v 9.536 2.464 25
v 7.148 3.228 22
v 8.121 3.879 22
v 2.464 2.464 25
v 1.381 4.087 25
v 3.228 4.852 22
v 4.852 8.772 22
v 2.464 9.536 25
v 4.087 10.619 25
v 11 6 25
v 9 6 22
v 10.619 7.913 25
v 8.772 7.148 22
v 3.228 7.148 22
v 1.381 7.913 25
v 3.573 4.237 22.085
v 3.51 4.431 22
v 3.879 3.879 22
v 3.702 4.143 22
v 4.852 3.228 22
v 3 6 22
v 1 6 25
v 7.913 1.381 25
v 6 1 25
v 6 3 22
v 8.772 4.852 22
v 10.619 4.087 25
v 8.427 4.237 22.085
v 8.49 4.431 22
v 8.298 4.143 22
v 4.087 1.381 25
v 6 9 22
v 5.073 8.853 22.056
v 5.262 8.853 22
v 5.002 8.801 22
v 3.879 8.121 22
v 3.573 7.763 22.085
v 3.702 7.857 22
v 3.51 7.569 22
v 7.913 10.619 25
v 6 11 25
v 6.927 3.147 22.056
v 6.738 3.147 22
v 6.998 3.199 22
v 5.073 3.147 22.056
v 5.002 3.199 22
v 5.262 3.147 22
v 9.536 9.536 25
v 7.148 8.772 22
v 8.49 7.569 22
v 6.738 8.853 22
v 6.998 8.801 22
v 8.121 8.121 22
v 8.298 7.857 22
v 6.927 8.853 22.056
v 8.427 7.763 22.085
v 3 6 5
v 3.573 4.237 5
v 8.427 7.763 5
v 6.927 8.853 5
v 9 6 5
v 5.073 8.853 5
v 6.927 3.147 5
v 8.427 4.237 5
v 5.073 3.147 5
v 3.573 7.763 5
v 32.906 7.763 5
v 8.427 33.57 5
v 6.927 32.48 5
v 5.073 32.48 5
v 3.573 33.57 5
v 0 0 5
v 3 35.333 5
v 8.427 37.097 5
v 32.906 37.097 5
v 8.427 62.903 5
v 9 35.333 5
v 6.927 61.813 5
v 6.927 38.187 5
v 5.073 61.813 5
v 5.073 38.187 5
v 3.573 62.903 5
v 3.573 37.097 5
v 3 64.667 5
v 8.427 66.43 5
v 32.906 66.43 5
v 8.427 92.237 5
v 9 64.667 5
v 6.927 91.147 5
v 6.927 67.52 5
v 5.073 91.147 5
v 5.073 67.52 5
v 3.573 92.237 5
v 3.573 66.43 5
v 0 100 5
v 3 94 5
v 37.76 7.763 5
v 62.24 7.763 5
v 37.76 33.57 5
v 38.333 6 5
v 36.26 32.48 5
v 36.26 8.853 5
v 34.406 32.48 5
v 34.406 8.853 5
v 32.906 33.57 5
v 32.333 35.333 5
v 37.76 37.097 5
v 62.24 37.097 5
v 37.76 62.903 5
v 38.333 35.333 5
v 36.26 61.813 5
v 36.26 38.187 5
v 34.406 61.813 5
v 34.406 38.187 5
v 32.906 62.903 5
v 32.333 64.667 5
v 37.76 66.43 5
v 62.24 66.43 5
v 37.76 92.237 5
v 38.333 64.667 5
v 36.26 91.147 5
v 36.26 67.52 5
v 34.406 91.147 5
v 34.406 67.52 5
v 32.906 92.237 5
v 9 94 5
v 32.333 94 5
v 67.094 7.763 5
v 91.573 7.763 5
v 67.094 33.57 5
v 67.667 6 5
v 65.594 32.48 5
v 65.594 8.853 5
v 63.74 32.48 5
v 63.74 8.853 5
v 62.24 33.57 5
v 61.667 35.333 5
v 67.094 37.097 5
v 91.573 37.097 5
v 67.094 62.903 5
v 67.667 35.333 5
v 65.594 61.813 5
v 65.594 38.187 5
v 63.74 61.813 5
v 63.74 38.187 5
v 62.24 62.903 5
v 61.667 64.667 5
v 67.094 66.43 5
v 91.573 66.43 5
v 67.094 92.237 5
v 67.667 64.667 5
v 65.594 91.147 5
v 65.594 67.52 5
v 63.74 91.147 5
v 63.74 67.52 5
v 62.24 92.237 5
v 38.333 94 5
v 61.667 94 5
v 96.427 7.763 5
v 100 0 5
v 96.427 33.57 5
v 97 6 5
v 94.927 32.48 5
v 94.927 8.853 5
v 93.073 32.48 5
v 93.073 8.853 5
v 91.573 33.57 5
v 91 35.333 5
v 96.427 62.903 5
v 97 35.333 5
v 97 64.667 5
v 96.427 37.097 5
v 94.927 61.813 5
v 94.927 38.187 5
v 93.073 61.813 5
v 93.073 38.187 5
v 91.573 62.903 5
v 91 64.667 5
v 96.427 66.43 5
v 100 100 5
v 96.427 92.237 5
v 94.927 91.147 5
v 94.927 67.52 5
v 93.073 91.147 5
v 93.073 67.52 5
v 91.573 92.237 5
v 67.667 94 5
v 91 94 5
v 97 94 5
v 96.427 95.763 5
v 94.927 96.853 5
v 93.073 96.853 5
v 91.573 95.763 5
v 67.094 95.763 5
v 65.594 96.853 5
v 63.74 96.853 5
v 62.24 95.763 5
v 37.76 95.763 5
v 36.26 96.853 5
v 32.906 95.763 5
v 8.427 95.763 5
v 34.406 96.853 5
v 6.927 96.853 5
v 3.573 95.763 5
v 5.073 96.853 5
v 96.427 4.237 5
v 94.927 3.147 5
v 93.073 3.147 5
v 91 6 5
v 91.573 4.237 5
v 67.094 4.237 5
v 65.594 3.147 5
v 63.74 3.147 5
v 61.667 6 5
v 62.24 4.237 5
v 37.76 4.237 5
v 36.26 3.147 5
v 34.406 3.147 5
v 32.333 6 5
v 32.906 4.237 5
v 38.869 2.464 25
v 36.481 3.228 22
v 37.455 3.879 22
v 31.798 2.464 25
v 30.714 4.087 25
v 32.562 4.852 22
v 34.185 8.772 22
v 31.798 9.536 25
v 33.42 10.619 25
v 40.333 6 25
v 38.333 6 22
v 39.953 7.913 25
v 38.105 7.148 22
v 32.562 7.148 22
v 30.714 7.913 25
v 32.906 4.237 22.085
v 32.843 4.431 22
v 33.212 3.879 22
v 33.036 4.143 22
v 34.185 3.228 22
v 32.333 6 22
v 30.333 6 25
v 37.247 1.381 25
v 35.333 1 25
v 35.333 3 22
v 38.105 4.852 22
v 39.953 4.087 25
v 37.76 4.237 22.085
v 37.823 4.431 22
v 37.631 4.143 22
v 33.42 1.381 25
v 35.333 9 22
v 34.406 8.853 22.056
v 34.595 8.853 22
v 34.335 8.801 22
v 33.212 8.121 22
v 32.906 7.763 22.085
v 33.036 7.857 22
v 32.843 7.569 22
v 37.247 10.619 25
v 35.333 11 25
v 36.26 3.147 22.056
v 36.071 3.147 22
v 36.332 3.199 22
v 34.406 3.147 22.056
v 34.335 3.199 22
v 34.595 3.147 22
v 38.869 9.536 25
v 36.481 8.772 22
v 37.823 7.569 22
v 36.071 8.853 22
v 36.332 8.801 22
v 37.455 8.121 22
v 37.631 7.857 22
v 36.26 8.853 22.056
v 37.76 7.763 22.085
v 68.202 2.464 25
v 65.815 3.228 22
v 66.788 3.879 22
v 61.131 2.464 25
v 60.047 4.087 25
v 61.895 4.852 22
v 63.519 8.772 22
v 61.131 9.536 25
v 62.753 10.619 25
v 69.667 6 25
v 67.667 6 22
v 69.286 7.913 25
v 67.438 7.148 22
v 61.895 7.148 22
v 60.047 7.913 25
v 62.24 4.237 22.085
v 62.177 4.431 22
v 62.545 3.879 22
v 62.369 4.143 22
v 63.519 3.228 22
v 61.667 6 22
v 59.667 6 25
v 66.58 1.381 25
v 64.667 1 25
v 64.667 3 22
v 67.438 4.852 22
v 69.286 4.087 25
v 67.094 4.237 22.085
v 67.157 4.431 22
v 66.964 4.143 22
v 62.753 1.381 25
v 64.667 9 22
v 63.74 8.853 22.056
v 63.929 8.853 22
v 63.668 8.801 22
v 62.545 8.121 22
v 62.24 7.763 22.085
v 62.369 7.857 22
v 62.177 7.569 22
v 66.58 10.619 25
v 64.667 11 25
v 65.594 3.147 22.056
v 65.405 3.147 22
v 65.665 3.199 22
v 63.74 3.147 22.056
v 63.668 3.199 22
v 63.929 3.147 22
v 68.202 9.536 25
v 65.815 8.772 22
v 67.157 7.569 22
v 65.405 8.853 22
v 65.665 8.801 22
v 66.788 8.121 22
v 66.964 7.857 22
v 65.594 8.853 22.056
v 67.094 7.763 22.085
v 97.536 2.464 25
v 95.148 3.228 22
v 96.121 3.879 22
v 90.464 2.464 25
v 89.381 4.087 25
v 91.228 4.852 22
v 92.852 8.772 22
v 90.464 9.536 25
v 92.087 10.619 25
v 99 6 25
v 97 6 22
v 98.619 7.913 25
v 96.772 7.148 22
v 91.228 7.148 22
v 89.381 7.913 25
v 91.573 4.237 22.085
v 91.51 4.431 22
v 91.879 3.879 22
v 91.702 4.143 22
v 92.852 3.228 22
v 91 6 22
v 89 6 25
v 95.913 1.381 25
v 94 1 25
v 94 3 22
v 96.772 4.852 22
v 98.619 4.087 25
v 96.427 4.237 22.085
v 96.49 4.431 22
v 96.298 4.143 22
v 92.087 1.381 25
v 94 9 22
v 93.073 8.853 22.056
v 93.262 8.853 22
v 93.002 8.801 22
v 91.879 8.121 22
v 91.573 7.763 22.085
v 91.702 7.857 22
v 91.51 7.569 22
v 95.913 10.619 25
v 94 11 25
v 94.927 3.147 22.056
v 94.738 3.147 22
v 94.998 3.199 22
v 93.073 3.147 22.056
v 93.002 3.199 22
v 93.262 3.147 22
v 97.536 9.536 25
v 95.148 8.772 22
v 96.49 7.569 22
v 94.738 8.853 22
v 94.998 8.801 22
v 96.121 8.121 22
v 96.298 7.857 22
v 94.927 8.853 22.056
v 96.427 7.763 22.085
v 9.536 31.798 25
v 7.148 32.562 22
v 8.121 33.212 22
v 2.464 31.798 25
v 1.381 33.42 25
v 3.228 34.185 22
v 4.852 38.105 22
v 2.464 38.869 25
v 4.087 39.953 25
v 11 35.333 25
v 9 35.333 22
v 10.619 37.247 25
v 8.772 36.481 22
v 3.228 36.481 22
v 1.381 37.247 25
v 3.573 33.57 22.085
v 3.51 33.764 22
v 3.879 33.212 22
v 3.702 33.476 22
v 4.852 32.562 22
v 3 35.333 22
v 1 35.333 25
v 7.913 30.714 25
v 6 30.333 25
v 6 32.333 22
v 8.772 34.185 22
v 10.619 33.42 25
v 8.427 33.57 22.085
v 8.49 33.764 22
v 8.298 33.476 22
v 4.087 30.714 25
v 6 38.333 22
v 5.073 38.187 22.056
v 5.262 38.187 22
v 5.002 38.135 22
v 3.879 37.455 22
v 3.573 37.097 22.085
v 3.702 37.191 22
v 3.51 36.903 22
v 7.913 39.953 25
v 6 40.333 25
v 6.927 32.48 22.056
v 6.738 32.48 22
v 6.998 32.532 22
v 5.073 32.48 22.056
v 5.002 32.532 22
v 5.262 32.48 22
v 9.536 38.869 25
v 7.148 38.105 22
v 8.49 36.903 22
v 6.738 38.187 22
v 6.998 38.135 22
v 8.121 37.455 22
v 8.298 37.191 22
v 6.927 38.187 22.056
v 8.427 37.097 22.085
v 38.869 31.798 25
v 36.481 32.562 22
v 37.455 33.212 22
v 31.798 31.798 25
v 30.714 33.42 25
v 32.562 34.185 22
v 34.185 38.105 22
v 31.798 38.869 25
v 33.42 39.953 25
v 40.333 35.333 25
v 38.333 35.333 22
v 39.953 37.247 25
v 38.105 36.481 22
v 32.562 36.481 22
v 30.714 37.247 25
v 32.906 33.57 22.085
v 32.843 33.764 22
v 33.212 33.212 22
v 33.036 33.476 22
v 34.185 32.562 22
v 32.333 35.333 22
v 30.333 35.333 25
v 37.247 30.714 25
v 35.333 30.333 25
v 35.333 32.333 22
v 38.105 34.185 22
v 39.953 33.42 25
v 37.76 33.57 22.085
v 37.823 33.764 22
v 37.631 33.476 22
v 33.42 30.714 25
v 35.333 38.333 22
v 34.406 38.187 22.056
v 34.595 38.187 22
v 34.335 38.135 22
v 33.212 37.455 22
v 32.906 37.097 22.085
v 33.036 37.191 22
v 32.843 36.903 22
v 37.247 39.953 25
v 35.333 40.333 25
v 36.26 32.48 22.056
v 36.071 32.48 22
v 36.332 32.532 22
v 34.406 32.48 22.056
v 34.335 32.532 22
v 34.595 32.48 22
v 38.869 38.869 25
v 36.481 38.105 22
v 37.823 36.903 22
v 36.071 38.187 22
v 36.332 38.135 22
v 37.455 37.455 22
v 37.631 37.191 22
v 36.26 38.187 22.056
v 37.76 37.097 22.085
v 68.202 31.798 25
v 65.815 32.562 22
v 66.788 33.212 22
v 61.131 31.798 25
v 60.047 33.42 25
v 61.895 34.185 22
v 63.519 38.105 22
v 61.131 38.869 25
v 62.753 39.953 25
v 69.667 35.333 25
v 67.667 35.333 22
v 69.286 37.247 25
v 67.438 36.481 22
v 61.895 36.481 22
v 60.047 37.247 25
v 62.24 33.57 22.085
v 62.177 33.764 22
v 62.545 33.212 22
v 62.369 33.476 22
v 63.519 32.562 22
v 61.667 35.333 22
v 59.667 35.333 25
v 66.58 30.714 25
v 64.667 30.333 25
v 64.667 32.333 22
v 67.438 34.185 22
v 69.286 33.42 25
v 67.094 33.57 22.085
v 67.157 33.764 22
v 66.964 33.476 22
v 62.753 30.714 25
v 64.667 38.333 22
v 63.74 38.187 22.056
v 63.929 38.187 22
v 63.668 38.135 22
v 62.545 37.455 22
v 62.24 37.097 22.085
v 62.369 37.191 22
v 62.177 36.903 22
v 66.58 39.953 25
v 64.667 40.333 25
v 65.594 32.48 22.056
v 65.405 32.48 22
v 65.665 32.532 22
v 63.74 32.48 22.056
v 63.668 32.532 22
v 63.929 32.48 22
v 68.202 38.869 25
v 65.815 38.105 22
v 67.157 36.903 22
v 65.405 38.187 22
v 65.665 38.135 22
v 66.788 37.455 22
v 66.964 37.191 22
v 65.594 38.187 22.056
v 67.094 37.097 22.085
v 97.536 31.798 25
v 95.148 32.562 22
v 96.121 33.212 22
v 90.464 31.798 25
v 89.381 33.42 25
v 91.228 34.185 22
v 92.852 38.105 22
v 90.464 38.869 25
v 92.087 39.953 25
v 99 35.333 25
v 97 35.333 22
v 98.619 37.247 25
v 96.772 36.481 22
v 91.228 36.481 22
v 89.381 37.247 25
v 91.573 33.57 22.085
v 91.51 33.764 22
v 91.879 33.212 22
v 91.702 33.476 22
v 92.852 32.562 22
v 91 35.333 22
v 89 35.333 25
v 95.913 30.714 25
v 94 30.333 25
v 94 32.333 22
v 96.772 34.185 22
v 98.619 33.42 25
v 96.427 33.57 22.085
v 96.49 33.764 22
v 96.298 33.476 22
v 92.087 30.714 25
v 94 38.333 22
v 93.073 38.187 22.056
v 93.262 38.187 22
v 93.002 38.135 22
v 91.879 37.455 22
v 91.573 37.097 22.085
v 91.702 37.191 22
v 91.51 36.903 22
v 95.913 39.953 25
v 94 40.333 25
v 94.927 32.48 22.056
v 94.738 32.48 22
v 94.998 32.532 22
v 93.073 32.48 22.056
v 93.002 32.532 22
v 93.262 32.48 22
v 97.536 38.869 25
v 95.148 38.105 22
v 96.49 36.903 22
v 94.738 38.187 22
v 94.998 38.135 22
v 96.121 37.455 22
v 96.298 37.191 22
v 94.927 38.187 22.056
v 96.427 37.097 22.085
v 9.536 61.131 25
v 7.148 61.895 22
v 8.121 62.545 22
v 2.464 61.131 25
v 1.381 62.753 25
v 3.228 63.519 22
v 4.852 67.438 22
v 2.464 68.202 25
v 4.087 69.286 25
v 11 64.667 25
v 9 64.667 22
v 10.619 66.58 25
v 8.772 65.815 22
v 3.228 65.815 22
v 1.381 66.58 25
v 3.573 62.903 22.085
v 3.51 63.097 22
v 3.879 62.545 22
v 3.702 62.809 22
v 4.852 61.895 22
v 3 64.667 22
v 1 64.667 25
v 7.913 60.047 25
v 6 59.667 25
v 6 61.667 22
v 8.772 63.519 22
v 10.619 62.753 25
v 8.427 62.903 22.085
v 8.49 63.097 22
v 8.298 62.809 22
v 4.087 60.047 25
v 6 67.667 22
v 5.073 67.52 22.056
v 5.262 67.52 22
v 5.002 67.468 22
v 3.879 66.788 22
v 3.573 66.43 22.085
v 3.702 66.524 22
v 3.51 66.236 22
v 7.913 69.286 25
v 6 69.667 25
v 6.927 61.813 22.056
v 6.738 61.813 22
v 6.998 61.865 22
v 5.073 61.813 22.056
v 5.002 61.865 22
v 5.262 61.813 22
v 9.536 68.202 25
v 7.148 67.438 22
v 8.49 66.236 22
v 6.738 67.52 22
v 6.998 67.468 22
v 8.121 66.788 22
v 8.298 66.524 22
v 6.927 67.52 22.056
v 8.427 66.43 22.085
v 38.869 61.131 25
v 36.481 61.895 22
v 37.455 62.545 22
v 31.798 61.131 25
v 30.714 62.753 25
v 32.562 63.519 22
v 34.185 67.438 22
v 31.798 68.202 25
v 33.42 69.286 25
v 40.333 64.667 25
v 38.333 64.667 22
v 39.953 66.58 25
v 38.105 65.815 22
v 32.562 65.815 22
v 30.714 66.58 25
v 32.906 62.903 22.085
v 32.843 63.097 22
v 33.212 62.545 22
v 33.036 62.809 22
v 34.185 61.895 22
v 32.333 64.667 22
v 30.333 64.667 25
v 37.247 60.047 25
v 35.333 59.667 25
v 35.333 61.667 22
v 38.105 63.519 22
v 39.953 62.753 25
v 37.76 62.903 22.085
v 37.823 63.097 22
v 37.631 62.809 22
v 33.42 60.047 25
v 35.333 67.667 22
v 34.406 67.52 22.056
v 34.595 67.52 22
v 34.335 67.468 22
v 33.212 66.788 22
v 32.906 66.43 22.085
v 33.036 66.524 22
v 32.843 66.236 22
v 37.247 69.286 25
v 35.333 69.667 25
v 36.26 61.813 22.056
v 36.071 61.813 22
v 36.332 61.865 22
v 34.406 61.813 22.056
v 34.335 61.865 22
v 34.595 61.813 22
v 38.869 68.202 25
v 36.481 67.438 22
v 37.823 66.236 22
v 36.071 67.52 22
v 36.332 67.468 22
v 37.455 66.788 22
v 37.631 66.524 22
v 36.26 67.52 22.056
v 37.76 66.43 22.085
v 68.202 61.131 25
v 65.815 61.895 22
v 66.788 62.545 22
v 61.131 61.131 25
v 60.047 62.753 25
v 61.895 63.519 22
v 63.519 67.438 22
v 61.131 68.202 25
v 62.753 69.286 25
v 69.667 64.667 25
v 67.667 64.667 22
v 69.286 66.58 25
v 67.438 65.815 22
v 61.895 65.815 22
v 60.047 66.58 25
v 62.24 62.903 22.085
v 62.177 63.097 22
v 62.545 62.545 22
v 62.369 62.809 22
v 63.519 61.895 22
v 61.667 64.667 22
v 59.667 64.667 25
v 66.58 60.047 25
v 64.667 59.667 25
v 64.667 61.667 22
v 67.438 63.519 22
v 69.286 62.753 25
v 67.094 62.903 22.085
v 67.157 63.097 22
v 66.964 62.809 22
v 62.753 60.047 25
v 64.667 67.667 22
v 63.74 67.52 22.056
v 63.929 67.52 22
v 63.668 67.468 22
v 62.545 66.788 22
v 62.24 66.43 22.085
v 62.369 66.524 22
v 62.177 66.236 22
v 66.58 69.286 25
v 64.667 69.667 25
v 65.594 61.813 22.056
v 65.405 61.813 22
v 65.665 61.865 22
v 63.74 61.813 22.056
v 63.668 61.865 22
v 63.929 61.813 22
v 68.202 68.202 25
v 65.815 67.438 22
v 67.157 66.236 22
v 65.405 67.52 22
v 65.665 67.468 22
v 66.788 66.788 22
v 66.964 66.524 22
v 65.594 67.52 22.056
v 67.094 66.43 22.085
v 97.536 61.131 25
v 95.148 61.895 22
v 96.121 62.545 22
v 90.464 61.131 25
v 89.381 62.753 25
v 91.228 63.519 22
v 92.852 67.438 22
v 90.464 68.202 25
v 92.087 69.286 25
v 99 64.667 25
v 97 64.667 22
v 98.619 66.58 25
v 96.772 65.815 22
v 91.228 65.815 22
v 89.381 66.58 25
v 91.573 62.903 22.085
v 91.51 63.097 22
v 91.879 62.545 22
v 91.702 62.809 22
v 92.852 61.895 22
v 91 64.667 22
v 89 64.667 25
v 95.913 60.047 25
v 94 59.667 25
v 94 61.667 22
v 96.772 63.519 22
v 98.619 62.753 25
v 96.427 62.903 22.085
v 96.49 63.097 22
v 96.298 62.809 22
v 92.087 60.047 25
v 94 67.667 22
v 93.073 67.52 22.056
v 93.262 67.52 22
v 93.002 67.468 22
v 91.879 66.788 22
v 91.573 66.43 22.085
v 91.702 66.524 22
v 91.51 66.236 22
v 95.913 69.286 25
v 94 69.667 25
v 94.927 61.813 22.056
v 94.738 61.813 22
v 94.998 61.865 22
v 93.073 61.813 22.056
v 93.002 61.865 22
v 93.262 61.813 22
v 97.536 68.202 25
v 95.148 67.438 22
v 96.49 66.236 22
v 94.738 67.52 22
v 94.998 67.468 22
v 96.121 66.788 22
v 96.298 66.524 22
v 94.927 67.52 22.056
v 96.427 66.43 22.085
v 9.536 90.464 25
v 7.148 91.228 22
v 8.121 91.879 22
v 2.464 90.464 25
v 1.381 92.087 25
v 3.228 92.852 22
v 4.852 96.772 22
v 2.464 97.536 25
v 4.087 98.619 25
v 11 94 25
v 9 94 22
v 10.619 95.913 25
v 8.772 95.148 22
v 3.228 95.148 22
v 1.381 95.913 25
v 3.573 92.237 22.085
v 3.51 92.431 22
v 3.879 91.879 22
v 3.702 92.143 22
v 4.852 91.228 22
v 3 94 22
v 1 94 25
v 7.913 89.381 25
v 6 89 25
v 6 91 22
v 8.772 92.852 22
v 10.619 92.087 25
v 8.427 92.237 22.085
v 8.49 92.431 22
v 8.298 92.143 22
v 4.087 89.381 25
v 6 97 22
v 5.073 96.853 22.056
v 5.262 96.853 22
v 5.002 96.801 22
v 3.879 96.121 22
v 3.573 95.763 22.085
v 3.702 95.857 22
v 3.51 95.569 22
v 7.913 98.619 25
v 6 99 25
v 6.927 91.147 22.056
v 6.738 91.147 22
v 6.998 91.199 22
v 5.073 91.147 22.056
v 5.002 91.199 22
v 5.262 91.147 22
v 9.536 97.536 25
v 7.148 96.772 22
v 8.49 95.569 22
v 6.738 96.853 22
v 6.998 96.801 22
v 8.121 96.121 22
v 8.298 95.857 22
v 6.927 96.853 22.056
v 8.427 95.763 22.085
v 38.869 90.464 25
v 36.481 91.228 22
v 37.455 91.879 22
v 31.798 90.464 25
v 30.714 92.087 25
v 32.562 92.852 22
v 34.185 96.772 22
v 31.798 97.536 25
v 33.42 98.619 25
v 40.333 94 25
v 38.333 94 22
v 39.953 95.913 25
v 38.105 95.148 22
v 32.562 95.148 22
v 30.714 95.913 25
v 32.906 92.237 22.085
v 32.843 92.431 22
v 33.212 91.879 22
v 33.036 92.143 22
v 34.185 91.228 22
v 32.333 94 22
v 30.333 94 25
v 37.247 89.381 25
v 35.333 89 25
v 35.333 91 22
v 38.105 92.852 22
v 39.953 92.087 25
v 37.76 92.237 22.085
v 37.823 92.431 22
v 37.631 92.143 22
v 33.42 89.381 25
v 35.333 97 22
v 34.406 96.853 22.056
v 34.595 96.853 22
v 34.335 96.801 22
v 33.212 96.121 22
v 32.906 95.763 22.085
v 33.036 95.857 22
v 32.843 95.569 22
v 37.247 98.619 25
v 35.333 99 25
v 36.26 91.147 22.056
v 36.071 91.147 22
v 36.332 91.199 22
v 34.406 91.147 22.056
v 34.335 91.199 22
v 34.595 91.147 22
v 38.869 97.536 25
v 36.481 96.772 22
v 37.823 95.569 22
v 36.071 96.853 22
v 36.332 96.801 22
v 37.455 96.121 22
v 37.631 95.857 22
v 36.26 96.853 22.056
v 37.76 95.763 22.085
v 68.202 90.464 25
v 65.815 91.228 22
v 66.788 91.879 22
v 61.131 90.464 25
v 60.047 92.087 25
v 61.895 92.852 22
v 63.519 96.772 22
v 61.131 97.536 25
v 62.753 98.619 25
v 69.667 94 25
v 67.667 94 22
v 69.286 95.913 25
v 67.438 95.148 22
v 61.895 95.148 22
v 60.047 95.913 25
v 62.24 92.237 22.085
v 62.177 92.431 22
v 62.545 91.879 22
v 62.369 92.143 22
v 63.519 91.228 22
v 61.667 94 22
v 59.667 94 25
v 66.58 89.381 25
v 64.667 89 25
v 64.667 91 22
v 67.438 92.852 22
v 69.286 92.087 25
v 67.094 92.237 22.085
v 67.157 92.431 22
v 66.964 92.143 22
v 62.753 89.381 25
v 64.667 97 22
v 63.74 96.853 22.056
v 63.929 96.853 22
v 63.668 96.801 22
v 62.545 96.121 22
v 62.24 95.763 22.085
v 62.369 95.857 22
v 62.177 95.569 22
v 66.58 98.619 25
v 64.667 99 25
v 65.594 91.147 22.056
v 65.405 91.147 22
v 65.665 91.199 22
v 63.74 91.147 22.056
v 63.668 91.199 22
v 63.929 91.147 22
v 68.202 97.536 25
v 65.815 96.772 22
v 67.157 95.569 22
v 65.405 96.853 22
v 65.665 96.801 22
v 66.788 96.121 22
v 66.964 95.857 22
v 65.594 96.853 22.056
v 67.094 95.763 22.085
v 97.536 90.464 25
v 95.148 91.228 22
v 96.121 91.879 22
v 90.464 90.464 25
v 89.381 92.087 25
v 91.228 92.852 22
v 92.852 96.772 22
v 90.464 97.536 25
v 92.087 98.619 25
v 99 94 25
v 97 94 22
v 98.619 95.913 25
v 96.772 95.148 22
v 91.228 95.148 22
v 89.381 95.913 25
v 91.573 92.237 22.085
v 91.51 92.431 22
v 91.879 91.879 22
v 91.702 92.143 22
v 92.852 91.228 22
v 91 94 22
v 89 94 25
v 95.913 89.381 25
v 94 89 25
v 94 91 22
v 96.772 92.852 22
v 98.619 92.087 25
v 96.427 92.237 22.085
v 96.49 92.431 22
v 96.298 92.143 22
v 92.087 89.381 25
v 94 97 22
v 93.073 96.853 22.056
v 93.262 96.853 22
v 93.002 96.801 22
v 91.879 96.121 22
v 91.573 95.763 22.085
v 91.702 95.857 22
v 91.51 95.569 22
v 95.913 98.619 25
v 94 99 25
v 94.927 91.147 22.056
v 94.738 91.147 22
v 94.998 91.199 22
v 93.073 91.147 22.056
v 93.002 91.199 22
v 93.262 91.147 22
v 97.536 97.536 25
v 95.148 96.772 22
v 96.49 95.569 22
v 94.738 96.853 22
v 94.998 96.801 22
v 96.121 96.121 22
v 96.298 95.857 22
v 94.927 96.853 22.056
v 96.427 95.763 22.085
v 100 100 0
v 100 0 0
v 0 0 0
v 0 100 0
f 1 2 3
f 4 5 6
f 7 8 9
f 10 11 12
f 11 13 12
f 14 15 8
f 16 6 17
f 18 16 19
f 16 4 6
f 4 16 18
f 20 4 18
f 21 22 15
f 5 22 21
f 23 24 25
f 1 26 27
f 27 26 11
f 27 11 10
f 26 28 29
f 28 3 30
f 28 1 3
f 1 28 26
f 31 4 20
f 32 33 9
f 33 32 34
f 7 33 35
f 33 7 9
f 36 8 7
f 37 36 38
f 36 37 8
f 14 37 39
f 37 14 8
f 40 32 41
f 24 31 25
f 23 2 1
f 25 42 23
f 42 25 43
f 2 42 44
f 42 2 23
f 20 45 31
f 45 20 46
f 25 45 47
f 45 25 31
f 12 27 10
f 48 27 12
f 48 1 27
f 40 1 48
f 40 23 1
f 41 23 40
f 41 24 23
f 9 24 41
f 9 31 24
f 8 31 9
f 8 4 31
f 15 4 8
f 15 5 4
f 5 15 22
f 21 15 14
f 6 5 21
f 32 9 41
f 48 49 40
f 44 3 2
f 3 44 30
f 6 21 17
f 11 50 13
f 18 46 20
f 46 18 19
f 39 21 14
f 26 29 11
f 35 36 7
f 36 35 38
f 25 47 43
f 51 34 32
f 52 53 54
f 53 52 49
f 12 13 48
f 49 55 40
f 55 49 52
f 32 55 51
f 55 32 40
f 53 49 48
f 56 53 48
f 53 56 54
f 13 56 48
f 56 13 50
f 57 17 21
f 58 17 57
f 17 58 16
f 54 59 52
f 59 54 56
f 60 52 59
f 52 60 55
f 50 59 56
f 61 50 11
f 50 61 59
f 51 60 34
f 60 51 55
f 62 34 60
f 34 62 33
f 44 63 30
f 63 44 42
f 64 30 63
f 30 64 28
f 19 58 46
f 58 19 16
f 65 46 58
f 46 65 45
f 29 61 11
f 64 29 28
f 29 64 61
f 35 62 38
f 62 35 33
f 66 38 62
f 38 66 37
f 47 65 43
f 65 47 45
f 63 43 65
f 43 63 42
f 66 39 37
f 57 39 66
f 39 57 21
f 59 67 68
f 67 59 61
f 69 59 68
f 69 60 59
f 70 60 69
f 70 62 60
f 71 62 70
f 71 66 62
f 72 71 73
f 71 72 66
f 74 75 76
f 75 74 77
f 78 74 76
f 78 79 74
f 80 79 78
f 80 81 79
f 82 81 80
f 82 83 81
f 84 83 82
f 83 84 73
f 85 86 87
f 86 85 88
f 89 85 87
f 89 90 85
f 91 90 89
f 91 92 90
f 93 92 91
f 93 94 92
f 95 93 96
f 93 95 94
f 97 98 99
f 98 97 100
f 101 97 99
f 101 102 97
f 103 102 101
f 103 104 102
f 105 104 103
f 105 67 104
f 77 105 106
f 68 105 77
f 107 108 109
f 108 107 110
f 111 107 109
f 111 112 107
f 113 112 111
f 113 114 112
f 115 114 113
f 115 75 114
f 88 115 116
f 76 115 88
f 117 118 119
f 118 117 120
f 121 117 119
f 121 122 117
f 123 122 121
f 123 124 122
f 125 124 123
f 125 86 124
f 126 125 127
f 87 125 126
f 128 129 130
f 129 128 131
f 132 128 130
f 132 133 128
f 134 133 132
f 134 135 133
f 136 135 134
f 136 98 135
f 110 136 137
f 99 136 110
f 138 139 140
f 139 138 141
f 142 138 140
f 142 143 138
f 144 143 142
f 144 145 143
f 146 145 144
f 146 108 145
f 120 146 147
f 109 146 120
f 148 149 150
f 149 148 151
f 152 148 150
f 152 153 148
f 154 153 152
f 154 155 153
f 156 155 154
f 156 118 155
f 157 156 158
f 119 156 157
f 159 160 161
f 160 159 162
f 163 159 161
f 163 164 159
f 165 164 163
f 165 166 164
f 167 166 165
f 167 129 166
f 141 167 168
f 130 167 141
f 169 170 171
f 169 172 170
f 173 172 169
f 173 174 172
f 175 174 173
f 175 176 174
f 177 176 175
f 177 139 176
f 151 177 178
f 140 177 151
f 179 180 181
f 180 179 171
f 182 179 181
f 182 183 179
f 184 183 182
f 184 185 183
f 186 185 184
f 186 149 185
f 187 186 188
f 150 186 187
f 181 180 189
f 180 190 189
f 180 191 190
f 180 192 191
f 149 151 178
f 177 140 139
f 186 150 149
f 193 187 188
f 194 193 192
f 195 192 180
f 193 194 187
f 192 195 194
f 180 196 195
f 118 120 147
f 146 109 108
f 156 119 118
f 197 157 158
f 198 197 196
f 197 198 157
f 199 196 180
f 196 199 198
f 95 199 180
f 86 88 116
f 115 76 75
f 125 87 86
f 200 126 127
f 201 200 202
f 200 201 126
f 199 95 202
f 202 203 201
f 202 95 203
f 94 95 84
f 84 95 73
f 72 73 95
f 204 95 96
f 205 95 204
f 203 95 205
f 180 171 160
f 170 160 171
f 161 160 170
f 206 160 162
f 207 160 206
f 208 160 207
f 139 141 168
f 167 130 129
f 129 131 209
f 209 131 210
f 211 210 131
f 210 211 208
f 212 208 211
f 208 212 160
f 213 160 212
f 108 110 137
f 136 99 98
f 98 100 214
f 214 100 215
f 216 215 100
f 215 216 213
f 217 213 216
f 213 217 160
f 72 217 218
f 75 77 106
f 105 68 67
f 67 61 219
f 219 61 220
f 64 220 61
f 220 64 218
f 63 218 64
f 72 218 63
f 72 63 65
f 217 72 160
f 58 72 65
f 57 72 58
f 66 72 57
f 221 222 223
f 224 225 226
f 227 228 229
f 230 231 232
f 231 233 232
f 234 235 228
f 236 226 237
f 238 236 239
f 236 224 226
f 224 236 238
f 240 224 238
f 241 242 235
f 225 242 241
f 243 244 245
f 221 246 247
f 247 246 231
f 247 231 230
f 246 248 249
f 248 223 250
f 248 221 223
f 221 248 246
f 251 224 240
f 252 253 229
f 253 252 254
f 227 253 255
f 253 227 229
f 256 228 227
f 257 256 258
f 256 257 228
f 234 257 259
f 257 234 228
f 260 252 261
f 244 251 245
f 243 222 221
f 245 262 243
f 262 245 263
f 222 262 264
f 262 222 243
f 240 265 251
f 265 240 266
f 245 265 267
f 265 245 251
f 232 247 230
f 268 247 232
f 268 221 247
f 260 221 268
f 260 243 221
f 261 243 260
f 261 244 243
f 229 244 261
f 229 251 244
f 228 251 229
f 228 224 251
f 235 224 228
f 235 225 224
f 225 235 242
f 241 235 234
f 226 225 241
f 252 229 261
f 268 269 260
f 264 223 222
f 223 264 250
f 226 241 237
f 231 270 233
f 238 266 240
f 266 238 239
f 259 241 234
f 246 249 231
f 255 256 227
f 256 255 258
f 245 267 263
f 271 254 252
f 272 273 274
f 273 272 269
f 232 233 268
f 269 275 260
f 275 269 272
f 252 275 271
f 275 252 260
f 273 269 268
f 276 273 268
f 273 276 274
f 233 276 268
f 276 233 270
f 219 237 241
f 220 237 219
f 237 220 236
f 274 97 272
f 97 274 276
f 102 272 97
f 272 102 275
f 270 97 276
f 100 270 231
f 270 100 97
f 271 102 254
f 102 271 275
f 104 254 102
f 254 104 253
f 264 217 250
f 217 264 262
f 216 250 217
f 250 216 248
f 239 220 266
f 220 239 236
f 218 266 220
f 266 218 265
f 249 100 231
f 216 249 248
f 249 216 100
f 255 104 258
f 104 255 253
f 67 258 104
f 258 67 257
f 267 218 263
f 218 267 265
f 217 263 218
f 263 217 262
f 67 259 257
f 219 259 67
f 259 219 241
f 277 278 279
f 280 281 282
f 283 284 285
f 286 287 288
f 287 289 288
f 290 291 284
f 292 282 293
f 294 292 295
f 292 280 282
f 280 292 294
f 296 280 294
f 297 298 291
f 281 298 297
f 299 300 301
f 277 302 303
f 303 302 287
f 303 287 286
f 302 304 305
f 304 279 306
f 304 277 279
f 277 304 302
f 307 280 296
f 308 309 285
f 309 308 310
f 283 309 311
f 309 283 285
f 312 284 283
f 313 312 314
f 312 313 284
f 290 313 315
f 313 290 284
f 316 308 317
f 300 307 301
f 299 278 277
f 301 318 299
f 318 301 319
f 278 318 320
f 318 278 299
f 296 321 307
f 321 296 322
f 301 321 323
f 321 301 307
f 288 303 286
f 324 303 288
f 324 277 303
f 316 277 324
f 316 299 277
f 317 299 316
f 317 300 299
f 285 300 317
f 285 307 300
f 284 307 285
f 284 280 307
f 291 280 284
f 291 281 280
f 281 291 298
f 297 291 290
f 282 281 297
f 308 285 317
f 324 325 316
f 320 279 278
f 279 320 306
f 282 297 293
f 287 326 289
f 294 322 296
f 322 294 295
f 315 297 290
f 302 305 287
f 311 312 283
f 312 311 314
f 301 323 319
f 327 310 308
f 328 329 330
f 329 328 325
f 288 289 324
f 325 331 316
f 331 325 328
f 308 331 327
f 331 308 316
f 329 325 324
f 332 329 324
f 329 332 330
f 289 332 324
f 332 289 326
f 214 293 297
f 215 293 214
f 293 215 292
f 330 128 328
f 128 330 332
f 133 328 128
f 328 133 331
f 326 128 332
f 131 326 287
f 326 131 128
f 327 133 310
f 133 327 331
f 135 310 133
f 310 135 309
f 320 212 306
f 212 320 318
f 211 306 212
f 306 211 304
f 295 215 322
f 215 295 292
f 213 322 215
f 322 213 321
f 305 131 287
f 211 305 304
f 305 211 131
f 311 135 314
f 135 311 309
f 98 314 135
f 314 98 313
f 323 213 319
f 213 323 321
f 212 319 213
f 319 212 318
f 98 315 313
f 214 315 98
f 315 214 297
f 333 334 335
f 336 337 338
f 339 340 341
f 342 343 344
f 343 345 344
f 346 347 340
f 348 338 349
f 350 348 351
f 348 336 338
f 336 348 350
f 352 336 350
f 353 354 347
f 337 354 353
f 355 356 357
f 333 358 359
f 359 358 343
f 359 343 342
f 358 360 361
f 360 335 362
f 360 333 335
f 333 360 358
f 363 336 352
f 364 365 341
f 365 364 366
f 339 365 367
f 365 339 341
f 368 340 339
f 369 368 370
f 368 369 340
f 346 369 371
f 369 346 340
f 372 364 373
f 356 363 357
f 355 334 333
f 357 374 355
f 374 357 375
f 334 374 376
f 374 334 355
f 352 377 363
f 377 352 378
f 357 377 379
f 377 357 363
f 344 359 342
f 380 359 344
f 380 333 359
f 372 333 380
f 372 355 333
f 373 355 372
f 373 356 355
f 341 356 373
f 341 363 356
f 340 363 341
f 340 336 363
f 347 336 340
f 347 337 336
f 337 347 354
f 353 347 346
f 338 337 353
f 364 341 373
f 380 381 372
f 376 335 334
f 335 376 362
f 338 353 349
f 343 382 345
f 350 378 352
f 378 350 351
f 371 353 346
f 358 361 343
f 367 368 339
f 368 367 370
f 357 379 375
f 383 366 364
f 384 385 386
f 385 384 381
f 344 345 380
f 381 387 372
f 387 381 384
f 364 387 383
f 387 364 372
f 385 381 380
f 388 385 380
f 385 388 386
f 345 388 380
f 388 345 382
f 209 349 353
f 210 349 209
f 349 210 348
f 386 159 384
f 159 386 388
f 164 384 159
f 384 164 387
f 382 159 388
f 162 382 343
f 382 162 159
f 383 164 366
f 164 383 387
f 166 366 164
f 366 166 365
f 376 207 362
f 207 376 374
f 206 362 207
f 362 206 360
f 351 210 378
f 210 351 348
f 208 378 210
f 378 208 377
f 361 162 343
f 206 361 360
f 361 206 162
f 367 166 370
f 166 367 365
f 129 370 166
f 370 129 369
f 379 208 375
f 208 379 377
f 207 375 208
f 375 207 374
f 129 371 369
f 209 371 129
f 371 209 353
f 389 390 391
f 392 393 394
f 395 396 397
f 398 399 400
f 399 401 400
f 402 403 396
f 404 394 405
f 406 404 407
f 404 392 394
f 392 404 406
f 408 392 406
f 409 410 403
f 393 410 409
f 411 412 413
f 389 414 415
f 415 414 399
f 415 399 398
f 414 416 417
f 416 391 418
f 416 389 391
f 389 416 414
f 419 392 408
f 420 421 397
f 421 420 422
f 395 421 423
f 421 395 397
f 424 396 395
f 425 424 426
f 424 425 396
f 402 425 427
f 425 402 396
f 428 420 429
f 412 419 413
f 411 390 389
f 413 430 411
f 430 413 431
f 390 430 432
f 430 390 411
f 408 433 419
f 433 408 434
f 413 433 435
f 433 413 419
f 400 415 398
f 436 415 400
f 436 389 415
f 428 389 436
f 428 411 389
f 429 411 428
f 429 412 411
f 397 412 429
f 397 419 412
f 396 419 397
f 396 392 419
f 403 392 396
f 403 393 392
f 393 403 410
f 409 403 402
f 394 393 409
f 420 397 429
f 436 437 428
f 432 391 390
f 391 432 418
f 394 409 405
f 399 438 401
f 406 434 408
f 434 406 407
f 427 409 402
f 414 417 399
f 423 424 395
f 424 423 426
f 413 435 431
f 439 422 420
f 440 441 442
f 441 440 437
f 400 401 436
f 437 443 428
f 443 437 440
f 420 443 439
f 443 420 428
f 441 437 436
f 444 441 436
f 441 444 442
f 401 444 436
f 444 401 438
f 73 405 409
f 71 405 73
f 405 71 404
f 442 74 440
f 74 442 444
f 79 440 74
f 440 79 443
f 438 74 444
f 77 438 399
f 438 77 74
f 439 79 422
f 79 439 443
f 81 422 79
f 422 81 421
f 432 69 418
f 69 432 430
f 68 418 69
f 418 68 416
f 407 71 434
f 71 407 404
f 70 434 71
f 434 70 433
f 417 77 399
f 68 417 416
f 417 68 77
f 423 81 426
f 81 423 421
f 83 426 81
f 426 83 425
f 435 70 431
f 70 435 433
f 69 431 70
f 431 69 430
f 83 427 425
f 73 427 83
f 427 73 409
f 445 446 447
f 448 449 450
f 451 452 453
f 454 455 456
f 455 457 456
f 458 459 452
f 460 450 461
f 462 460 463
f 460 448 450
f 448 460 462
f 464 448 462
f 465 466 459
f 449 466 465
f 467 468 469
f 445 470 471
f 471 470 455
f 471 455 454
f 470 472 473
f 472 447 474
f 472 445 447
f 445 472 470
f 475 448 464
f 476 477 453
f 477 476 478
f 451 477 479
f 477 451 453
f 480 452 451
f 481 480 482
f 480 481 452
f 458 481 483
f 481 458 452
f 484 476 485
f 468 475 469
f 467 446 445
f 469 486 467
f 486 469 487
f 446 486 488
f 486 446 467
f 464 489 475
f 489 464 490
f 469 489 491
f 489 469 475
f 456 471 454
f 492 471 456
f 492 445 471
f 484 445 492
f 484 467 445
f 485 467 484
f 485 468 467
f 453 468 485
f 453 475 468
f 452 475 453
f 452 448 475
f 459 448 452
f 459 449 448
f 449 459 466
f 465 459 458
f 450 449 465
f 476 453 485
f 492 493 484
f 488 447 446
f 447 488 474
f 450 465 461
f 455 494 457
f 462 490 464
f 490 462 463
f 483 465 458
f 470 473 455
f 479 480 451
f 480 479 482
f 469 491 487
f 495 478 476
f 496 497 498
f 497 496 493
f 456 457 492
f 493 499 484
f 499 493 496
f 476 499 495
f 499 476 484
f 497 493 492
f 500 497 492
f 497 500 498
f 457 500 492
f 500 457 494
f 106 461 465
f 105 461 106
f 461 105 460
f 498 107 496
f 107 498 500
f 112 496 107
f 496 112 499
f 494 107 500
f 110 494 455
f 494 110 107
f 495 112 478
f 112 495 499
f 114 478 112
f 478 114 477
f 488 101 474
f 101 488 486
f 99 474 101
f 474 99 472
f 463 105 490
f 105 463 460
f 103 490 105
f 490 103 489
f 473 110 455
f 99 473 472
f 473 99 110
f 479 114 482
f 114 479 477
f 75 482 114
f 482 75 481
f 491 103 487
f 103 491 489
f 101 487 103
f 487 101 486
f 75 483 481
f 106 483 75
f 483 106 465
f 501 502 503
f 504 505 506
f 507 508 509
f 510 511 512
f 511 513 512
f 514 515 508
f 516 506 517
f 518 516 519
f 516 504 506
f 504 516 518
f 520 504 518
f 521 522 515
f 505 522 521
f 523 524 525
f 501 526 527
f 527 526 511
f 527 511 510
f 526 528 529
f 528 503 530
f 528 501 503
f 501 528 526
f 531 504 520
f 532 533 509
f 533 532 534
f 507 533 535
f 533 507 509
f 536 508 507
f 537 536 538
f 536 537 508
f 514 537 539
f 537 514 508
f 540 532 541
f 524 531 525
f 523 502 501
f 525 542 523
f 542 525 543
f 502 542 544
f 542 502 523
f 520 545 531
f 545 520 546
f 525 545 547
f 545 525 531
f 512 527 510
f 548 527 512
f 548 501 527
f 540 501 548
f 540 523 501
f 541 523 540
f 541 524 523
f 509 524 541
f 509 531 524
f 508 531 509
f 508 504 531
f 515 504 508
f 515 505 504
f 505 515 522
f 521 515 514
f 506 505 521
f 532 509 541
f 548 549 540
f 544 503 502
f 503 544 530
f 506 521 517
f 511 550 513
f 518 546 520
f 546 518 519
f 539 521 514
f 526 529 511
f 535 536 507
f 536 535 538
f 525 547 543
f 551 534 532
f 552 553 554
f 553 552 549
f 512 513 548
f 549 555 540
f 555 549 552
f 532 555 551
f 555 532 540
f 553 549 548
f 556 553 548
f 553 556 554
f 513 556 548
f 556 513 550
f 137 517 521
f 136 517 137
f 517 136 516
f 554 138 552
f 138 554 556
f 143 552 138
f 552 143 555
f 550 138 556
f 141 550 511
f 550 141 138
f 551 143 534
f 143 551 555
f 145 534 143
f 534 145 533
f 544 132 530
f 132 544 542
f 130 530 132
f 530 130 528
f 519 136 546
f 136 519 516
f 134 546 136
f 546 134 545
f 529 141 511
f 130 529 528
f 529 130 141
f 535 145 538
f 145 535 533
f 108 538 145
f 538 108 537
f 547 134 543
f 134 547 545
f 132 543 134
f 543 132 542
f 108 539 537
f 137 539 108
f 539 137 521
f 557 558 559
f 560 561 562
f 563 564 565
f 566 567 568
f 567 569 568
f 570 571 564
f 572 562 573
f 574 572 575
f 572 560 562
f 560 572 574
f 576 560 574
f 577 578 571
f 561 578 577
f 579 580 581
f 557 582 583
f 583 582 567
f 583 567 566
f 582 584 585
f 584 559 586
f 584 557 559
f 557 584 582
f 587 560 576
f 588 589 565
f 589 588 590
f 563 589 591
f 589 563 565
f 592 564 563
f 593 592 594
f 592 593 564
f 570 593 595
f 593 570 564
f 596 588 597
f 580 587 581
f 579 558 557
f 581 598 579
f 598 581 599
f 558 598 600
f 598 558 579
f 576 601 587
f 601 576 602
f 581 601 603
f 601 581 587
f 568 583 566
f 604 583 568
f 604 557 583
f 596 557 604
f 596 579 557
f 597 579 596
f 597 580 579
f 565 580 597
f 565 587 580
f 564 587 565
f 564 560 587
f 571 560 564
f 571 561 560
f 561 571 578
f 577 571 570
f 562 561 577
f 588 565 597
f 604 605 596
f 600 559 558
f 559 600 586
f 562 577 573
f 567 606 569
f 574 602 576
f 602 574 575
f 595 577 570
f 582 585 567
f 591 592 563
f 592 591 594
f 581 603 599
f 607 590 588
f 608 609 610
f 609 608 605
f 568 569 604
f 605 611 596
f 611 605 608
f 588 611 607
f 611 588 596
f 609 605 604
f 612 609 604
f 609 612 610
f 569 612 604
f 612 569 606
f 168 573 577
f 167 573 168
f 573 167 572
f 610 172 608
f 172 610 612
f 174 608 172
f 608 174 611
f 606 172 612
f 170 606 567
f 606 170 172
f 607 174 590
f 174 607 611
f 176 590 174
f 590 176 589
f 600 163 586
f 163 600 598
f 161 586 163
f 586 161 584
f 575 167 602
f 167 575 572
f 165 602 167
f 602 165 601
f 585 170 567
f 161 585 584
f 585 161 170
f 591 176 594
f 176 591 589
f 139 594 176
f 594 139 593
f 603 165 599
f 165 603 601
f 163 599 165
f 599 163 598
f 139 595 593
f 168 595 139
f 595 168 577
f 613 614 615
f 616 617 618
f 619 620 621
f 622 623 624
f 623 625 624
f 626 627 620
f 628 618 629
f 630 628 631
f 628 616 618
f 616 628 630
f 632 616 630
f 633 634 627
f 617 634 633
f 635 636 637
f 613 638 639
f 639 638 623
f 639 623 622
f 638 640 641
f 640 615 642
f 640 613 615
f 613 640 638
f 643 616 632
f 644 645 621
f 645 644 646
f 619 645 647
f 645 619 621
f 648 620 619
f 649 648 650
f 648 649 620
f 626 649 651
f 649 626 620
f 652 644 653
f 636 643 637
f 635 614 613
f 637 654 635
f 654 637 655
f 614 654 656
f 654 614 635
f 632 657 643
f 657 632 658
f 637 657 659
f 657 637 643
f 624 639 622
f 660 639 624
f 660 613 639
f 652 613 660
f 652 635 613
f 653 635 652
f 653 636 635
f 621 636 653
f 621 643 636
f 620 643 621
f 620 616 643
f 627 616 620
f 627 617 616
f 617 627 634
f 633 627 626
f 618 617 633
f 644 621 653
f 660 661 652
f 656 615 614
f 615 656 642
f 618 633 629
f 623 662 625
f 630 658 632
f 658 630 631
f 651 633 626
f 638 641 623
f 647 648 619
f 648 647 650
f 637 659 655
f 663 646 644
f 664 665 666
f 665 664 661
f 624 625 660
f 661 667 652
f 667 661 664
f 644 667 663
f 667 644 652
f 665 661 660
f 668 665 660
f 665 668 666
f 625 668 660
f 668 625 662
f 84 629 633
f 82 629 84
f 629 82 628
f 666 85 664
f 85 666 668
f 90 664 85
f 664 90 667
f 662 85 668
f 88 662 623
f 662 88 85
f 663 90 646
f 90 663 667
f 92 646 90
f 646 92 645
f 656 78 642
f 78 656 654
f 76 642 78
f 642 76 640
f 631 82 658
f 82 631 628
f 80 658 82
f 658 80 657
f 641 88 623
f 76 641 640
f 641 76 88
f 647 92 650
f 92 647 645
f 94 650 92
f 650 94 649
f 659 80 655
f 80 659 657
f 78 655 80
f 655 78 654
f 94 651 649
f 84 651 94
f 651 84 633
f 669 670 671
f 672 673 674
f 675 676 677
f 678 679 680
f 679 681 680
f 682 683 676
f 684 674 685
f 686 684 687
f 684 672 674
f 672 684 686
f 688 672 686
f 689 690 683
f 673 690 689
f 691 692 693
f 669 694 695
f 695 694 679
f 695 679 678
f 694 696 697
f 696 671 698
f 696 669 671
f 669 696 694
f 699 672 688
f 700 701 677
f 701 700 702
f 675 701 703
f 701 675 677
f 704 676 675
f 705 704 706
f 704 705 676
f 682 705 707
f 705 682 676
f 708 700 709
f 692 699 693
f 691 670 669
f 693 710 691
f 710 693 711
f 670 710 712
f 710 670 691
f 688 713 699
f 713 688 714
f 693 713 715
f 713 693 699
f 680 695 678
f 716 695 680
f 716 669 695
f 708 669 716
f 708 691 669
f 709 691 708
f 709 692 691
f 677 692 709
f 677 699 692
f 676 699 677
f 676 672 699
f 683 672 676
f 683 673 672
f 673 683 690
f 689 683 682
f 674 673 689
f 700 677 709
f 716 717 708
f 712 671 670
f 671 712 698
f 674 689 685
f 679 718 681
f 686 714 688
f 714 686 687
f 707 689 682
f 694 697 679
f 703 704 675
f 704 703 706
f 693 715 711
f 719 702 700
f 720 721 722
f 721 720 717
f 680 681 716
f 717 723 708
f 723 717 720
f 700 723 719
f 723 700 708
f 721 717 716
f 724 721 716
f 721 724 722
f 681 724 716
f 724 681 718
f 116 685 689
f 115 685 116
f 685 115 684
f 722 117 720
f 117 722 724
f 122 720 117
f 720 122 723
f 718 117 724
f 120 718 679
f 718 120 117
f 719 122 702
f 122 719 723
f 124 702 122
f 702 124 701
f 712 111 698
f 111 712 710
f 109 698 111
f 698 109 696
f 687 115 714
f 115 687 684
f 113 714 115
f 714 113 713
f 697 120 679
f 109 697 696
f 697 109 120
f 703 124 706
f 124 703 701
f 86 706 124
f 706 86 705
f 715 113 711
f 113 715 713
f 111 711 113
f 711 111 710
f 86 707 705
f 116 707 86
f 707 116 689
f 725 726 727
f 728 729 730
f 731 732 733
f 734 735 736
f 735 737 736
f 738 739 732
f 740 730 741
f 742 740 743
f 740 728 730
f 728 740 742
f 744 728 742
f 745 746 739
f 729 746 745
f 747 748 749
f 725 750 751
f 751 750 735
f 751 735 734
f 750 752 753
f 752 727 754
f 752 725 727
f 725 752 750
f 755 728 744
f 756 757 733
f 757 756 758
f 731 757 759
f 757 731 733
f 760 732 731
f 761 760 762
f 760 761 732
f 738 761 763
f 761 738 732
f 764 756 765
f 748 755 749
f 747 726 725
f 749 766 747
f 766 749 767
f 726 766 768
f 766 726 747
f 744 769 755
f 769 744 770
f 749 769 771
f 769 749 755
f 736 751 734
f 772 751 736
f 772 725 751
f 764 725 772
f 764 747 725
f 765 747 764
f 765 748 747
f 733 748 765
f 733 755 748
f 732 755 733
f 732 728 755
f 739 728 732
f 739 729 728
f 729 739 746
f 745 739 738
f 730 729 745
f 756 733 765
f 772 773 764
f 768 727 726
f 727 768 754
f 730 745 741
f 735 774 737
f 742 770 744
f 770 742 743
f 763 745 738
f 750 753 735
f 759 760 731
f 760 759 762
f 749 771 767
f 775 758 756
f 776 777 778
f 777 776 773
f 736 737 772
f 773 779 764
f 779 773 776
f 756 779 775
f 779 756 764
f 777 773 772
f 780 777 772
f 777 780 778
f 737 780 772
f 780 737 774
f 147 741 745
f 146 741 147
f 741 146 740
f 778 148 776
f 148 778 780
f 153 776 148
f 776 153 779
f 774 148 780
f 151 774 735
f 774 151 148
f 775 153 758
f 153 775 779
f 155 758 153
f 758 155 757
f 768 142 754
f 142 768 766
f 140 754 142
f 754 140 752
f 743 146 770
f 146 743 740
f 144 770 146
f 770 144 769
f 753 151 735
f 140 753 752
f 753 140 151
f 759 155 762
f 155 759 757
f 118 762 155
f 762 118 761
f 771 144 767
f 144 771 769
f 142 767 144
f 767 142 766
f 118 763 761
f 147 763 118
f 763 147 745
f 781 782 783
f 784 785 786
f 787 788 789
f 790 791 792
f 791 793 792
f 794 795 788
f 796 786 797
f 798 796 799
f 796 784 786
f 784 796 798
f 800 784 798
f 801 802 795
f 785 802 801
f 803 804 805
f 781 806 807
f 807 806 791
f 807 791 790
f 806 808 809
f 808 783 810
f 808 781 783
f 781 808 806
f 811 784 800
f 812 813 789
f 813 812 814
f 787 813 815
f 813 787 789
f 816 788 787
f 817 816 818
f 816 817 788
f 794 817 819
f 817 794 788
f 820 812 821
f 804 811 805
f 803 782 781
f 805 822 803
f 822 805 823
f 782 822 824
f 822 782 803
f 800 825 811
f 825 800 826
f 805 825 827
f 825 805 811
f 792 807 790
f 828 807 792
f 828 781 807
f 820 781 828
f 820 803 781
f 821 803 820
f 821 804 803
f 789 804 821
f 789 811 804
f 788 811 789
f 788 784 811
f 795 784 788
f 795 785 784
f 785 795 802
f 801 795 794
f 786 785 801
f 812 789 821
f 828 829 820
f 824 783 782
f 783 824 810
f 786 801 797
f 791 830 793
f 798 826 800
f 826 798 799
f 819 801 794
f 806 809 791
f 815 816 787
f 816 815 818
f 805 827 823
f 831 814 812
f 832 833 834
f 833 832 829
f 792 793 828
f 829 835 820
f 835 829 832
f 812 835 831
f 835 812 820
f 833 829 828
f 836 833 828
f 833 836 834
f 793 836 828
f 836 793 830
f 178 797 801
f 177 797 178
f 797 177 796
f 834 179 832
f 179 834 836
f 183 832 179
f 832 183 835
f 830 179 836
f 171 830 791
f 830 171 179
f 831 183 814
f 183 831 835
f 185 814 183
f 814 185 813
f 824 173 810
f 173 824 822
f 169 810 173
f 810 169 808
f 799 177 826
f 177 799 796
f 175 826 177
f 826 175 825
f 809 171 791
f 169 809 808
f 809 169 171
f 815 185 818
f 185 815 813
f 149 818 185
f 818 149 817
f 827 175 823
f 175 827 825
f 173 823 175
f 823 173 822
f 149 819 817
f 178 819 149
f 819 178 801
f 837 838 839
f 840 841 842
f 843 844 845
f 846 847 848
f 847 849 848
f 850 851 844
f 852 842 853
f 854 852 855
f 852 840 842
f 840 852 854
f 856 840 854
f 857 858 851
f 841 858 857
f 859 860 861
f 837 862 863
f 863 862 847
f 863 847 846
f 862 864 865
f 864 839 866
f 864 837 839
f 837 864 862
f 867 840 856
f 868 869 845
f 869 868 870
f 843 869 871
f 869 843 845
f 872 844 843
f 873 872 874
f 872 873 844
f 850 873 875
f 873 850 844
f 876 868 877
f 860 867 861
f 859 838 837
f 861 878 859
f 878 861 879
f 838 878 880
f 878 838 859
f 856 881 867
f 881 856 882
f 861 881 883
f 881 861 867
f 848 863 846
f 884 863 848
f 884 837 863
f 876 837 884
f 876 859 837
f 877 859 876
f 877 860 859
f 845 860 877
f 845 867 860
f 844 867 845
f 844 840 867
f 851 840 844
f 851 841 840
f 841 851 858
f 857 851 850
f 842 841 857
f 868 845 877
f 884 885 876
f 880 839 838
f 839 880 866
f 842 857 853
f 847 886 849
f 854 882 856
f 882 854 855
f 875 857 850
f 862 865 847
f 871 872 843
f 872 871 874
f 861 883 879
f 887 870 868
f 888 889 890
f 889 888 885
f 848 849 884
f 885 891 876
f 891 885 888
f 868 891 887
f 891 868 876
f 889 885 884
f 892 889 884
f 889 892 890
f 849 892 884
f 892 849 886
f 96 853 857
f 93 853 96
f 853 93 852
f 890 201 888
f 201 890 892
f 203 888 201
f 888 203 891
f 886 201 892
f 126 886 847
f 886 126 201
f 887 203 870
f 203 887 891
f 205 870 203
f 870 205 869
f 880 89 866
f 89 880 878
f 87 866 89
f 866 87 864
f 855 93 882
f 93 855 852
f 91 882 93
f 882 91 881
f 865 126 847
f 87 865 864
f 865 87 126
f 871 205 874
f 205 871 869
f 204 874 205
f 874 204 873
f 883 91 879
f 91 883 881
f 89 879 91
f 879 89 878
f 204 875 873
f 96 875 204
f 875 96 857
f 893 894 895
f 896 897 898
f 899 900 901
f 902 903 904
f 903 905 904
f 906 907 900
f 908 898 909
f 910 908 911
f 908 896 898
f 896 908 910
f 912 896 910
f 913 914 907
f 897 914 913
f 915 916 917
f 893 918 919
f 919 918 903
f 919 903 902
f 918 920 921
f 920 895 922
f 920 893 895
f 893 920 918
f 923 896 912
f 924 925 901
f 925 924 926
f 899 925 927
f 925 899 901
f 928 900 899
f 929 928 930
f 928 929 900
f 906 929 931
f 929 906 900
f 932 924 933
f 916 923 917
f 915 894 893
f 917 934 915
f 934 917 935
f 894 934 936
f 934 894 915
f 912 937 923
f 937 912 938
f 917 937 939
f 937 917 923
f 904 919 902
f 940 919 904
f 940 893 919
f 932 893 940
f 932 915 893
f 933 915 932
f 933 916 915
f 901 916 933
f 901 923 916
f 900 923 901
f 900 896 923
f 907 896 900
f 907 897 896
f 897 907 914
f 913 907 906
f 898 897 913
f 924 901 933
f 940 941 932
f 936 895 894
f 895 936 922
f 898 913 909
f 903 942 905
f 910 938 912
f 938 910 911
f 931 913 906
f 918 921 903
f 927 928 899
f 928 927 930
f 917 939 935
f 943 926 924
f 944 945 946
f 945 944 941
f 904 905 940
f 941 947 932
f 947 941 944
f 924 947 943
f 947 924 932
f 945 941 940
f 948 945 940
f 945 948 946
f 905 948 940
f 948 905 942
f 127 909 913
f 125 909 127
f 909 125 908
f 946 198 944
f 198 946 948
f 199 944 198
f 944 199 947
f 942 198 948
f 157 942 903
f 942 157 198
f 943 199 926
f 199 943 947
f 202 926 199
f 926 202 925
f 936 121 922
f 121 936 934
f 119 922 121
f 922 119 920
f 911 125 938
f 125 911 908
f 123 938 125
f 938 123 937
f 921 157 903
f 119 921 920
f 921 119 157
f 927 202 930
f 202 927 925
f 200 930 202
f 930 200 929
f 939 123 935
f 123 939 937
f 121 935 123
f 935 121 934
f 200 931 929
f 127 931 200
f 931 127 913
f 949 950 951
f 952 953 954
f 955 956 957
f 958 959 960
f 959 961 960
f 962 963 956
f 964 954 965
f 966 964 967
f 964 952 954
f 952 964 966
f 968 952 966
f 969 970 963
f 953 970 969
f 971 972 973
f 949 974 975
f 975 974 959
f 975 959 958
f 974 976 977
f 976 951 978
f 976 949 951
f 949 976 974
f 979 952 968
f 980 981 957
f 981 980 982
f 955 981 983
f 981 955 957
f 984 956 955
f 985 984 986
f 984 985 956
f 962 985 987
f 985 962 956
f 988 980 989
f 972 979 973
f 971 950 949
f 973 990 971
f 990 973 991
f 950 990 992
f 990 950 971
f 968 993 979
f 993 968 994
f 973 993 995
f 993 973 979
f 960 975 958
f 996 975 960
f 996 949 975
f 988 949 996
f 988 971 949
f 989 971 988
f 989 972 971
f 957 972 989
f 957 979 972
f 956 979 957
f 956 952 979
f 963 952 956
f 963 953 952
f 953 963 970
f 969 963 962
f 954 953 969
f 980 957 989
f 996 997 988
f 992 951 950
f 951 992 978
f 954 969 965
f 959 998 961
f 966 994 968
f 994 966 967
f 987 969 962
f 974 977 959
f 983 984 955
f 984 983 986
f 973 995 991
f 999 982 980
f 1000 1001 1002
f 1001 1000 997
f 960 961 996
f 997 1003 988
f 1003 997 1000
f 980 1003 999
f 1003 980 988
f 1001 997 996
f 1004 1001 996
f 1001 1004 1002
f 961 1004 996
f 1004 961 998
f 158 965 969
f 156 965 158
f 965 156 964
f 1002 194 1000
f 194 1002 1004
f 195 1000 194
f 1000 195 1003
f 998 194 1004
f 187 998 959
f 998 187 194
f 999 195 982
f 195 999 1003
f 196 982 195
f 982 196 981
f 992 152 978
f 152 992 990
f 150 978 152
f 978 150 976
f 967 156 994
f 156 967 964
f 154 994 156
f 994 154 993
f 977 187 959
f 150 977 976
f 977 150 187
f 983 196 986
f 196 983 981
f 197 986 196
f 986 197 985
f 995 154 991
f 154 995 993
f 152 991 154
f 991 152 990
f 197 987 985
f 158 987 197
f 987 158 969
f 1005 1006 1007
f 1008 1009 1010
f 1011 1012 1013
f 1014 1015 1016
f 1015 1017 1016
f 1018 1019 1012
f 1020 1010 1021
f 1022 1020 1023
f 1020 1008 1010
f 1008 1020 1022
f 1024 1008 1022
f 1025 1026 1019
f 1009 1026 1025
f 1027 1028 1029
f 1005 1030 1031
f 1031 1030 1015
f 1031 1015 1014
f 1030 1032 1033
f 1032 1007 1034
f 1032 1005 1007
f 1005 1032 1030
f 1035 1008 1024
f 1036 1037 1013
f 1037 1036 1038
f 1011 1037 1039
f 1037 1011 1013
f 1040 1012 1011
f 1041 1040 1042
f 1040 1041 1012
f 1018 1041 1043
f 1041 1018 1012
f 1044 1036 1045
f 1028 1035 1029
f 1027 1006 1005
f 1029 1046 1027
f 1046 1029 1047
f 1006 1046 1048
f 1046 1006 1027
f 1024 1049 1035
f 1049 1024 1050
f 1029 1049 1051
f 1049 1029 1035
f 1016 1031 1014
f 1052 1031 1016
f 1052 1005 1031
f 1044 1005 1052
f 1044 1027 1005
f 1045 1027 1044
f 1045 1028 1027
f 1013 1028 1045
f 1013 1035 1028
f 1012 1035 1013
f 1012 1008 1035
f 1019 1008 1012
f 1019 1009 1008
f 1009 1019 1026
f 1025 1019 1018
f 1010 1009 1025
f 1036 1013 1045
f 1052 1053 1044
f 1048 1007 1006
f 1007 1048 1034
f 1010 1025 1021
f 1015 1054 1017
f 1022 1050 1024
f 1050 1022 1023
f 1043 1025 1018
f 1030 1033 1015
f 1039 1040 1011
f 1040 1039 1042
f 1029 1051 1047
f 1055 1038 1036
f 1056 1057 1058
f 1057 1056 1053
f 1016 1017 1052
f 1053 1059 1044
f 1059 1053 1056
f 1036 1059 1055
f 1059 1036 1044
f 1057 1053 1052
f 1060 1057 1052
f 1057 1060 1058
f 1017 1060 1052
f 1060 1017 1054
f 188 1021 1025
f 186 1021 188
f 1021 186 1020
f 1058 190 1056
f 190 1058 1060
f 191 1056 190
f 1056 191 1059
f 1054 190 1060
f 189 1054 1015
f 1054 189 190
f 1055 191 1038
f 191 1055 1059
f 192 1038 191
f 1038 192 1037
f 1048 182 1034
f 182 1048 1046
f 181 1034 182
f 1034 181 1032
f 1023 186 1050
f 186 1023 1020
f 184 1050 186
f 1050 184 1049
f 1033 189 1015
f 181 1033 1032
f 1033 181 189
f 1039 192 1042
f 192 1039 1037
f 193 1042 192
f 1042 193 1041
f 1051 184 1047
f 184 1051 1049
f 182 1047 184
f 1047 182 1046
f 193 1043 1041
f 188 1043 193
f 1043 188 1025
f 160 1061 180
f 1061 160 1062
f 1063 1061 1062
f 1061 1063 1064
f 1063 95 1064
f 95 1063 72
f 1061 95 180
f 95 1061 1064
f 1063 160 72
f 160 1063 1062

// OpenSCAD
//This creates a customizable square geoboard. Everything I could think of is customizable.

//Size of base
base_size = 100; // [10:500]

//Thickness of base
base_thickness = 5;

//Peg thickness
peg_thickness = 3; // [1:10]

//Peg height
peg_height = 20; // [10:50]

//Number of pegs on X axis
X_pegs = 4;

//Number of pegs on Y axis
Y_pegs = 4;

//Width of step on top of peg
step_width = 2; // [0:5]

//% of peg height for step
step_percent = 15; // [5:90]

module peg()
{
translate([0,0,(peg_height+base_thickness)-peg_height*(step_percent/100)])cylinder(peg_height*(step_percent/100),peg_thickness,peg_thickness+step_width);
translate([0,0,base_thickness])cylinder(peg_height,peg_thickness,peg_thickness);
}
cube([base_size,base_size,base_thickness]);

module peg_line()
{
for (i = [0 : X_pegs-1] ){
translate([((base_size-peg_thickness*4)/(X_pegs-1))*(i)+peg_thickness*2,peg_thickness*2,0]) peg();
}
}

for (i = [0 : Y_pegs-1] ){
translate([0,((base_size-peg_thickness*4)/(Y_pegs-1))*(i),0]) peg_line();
}
